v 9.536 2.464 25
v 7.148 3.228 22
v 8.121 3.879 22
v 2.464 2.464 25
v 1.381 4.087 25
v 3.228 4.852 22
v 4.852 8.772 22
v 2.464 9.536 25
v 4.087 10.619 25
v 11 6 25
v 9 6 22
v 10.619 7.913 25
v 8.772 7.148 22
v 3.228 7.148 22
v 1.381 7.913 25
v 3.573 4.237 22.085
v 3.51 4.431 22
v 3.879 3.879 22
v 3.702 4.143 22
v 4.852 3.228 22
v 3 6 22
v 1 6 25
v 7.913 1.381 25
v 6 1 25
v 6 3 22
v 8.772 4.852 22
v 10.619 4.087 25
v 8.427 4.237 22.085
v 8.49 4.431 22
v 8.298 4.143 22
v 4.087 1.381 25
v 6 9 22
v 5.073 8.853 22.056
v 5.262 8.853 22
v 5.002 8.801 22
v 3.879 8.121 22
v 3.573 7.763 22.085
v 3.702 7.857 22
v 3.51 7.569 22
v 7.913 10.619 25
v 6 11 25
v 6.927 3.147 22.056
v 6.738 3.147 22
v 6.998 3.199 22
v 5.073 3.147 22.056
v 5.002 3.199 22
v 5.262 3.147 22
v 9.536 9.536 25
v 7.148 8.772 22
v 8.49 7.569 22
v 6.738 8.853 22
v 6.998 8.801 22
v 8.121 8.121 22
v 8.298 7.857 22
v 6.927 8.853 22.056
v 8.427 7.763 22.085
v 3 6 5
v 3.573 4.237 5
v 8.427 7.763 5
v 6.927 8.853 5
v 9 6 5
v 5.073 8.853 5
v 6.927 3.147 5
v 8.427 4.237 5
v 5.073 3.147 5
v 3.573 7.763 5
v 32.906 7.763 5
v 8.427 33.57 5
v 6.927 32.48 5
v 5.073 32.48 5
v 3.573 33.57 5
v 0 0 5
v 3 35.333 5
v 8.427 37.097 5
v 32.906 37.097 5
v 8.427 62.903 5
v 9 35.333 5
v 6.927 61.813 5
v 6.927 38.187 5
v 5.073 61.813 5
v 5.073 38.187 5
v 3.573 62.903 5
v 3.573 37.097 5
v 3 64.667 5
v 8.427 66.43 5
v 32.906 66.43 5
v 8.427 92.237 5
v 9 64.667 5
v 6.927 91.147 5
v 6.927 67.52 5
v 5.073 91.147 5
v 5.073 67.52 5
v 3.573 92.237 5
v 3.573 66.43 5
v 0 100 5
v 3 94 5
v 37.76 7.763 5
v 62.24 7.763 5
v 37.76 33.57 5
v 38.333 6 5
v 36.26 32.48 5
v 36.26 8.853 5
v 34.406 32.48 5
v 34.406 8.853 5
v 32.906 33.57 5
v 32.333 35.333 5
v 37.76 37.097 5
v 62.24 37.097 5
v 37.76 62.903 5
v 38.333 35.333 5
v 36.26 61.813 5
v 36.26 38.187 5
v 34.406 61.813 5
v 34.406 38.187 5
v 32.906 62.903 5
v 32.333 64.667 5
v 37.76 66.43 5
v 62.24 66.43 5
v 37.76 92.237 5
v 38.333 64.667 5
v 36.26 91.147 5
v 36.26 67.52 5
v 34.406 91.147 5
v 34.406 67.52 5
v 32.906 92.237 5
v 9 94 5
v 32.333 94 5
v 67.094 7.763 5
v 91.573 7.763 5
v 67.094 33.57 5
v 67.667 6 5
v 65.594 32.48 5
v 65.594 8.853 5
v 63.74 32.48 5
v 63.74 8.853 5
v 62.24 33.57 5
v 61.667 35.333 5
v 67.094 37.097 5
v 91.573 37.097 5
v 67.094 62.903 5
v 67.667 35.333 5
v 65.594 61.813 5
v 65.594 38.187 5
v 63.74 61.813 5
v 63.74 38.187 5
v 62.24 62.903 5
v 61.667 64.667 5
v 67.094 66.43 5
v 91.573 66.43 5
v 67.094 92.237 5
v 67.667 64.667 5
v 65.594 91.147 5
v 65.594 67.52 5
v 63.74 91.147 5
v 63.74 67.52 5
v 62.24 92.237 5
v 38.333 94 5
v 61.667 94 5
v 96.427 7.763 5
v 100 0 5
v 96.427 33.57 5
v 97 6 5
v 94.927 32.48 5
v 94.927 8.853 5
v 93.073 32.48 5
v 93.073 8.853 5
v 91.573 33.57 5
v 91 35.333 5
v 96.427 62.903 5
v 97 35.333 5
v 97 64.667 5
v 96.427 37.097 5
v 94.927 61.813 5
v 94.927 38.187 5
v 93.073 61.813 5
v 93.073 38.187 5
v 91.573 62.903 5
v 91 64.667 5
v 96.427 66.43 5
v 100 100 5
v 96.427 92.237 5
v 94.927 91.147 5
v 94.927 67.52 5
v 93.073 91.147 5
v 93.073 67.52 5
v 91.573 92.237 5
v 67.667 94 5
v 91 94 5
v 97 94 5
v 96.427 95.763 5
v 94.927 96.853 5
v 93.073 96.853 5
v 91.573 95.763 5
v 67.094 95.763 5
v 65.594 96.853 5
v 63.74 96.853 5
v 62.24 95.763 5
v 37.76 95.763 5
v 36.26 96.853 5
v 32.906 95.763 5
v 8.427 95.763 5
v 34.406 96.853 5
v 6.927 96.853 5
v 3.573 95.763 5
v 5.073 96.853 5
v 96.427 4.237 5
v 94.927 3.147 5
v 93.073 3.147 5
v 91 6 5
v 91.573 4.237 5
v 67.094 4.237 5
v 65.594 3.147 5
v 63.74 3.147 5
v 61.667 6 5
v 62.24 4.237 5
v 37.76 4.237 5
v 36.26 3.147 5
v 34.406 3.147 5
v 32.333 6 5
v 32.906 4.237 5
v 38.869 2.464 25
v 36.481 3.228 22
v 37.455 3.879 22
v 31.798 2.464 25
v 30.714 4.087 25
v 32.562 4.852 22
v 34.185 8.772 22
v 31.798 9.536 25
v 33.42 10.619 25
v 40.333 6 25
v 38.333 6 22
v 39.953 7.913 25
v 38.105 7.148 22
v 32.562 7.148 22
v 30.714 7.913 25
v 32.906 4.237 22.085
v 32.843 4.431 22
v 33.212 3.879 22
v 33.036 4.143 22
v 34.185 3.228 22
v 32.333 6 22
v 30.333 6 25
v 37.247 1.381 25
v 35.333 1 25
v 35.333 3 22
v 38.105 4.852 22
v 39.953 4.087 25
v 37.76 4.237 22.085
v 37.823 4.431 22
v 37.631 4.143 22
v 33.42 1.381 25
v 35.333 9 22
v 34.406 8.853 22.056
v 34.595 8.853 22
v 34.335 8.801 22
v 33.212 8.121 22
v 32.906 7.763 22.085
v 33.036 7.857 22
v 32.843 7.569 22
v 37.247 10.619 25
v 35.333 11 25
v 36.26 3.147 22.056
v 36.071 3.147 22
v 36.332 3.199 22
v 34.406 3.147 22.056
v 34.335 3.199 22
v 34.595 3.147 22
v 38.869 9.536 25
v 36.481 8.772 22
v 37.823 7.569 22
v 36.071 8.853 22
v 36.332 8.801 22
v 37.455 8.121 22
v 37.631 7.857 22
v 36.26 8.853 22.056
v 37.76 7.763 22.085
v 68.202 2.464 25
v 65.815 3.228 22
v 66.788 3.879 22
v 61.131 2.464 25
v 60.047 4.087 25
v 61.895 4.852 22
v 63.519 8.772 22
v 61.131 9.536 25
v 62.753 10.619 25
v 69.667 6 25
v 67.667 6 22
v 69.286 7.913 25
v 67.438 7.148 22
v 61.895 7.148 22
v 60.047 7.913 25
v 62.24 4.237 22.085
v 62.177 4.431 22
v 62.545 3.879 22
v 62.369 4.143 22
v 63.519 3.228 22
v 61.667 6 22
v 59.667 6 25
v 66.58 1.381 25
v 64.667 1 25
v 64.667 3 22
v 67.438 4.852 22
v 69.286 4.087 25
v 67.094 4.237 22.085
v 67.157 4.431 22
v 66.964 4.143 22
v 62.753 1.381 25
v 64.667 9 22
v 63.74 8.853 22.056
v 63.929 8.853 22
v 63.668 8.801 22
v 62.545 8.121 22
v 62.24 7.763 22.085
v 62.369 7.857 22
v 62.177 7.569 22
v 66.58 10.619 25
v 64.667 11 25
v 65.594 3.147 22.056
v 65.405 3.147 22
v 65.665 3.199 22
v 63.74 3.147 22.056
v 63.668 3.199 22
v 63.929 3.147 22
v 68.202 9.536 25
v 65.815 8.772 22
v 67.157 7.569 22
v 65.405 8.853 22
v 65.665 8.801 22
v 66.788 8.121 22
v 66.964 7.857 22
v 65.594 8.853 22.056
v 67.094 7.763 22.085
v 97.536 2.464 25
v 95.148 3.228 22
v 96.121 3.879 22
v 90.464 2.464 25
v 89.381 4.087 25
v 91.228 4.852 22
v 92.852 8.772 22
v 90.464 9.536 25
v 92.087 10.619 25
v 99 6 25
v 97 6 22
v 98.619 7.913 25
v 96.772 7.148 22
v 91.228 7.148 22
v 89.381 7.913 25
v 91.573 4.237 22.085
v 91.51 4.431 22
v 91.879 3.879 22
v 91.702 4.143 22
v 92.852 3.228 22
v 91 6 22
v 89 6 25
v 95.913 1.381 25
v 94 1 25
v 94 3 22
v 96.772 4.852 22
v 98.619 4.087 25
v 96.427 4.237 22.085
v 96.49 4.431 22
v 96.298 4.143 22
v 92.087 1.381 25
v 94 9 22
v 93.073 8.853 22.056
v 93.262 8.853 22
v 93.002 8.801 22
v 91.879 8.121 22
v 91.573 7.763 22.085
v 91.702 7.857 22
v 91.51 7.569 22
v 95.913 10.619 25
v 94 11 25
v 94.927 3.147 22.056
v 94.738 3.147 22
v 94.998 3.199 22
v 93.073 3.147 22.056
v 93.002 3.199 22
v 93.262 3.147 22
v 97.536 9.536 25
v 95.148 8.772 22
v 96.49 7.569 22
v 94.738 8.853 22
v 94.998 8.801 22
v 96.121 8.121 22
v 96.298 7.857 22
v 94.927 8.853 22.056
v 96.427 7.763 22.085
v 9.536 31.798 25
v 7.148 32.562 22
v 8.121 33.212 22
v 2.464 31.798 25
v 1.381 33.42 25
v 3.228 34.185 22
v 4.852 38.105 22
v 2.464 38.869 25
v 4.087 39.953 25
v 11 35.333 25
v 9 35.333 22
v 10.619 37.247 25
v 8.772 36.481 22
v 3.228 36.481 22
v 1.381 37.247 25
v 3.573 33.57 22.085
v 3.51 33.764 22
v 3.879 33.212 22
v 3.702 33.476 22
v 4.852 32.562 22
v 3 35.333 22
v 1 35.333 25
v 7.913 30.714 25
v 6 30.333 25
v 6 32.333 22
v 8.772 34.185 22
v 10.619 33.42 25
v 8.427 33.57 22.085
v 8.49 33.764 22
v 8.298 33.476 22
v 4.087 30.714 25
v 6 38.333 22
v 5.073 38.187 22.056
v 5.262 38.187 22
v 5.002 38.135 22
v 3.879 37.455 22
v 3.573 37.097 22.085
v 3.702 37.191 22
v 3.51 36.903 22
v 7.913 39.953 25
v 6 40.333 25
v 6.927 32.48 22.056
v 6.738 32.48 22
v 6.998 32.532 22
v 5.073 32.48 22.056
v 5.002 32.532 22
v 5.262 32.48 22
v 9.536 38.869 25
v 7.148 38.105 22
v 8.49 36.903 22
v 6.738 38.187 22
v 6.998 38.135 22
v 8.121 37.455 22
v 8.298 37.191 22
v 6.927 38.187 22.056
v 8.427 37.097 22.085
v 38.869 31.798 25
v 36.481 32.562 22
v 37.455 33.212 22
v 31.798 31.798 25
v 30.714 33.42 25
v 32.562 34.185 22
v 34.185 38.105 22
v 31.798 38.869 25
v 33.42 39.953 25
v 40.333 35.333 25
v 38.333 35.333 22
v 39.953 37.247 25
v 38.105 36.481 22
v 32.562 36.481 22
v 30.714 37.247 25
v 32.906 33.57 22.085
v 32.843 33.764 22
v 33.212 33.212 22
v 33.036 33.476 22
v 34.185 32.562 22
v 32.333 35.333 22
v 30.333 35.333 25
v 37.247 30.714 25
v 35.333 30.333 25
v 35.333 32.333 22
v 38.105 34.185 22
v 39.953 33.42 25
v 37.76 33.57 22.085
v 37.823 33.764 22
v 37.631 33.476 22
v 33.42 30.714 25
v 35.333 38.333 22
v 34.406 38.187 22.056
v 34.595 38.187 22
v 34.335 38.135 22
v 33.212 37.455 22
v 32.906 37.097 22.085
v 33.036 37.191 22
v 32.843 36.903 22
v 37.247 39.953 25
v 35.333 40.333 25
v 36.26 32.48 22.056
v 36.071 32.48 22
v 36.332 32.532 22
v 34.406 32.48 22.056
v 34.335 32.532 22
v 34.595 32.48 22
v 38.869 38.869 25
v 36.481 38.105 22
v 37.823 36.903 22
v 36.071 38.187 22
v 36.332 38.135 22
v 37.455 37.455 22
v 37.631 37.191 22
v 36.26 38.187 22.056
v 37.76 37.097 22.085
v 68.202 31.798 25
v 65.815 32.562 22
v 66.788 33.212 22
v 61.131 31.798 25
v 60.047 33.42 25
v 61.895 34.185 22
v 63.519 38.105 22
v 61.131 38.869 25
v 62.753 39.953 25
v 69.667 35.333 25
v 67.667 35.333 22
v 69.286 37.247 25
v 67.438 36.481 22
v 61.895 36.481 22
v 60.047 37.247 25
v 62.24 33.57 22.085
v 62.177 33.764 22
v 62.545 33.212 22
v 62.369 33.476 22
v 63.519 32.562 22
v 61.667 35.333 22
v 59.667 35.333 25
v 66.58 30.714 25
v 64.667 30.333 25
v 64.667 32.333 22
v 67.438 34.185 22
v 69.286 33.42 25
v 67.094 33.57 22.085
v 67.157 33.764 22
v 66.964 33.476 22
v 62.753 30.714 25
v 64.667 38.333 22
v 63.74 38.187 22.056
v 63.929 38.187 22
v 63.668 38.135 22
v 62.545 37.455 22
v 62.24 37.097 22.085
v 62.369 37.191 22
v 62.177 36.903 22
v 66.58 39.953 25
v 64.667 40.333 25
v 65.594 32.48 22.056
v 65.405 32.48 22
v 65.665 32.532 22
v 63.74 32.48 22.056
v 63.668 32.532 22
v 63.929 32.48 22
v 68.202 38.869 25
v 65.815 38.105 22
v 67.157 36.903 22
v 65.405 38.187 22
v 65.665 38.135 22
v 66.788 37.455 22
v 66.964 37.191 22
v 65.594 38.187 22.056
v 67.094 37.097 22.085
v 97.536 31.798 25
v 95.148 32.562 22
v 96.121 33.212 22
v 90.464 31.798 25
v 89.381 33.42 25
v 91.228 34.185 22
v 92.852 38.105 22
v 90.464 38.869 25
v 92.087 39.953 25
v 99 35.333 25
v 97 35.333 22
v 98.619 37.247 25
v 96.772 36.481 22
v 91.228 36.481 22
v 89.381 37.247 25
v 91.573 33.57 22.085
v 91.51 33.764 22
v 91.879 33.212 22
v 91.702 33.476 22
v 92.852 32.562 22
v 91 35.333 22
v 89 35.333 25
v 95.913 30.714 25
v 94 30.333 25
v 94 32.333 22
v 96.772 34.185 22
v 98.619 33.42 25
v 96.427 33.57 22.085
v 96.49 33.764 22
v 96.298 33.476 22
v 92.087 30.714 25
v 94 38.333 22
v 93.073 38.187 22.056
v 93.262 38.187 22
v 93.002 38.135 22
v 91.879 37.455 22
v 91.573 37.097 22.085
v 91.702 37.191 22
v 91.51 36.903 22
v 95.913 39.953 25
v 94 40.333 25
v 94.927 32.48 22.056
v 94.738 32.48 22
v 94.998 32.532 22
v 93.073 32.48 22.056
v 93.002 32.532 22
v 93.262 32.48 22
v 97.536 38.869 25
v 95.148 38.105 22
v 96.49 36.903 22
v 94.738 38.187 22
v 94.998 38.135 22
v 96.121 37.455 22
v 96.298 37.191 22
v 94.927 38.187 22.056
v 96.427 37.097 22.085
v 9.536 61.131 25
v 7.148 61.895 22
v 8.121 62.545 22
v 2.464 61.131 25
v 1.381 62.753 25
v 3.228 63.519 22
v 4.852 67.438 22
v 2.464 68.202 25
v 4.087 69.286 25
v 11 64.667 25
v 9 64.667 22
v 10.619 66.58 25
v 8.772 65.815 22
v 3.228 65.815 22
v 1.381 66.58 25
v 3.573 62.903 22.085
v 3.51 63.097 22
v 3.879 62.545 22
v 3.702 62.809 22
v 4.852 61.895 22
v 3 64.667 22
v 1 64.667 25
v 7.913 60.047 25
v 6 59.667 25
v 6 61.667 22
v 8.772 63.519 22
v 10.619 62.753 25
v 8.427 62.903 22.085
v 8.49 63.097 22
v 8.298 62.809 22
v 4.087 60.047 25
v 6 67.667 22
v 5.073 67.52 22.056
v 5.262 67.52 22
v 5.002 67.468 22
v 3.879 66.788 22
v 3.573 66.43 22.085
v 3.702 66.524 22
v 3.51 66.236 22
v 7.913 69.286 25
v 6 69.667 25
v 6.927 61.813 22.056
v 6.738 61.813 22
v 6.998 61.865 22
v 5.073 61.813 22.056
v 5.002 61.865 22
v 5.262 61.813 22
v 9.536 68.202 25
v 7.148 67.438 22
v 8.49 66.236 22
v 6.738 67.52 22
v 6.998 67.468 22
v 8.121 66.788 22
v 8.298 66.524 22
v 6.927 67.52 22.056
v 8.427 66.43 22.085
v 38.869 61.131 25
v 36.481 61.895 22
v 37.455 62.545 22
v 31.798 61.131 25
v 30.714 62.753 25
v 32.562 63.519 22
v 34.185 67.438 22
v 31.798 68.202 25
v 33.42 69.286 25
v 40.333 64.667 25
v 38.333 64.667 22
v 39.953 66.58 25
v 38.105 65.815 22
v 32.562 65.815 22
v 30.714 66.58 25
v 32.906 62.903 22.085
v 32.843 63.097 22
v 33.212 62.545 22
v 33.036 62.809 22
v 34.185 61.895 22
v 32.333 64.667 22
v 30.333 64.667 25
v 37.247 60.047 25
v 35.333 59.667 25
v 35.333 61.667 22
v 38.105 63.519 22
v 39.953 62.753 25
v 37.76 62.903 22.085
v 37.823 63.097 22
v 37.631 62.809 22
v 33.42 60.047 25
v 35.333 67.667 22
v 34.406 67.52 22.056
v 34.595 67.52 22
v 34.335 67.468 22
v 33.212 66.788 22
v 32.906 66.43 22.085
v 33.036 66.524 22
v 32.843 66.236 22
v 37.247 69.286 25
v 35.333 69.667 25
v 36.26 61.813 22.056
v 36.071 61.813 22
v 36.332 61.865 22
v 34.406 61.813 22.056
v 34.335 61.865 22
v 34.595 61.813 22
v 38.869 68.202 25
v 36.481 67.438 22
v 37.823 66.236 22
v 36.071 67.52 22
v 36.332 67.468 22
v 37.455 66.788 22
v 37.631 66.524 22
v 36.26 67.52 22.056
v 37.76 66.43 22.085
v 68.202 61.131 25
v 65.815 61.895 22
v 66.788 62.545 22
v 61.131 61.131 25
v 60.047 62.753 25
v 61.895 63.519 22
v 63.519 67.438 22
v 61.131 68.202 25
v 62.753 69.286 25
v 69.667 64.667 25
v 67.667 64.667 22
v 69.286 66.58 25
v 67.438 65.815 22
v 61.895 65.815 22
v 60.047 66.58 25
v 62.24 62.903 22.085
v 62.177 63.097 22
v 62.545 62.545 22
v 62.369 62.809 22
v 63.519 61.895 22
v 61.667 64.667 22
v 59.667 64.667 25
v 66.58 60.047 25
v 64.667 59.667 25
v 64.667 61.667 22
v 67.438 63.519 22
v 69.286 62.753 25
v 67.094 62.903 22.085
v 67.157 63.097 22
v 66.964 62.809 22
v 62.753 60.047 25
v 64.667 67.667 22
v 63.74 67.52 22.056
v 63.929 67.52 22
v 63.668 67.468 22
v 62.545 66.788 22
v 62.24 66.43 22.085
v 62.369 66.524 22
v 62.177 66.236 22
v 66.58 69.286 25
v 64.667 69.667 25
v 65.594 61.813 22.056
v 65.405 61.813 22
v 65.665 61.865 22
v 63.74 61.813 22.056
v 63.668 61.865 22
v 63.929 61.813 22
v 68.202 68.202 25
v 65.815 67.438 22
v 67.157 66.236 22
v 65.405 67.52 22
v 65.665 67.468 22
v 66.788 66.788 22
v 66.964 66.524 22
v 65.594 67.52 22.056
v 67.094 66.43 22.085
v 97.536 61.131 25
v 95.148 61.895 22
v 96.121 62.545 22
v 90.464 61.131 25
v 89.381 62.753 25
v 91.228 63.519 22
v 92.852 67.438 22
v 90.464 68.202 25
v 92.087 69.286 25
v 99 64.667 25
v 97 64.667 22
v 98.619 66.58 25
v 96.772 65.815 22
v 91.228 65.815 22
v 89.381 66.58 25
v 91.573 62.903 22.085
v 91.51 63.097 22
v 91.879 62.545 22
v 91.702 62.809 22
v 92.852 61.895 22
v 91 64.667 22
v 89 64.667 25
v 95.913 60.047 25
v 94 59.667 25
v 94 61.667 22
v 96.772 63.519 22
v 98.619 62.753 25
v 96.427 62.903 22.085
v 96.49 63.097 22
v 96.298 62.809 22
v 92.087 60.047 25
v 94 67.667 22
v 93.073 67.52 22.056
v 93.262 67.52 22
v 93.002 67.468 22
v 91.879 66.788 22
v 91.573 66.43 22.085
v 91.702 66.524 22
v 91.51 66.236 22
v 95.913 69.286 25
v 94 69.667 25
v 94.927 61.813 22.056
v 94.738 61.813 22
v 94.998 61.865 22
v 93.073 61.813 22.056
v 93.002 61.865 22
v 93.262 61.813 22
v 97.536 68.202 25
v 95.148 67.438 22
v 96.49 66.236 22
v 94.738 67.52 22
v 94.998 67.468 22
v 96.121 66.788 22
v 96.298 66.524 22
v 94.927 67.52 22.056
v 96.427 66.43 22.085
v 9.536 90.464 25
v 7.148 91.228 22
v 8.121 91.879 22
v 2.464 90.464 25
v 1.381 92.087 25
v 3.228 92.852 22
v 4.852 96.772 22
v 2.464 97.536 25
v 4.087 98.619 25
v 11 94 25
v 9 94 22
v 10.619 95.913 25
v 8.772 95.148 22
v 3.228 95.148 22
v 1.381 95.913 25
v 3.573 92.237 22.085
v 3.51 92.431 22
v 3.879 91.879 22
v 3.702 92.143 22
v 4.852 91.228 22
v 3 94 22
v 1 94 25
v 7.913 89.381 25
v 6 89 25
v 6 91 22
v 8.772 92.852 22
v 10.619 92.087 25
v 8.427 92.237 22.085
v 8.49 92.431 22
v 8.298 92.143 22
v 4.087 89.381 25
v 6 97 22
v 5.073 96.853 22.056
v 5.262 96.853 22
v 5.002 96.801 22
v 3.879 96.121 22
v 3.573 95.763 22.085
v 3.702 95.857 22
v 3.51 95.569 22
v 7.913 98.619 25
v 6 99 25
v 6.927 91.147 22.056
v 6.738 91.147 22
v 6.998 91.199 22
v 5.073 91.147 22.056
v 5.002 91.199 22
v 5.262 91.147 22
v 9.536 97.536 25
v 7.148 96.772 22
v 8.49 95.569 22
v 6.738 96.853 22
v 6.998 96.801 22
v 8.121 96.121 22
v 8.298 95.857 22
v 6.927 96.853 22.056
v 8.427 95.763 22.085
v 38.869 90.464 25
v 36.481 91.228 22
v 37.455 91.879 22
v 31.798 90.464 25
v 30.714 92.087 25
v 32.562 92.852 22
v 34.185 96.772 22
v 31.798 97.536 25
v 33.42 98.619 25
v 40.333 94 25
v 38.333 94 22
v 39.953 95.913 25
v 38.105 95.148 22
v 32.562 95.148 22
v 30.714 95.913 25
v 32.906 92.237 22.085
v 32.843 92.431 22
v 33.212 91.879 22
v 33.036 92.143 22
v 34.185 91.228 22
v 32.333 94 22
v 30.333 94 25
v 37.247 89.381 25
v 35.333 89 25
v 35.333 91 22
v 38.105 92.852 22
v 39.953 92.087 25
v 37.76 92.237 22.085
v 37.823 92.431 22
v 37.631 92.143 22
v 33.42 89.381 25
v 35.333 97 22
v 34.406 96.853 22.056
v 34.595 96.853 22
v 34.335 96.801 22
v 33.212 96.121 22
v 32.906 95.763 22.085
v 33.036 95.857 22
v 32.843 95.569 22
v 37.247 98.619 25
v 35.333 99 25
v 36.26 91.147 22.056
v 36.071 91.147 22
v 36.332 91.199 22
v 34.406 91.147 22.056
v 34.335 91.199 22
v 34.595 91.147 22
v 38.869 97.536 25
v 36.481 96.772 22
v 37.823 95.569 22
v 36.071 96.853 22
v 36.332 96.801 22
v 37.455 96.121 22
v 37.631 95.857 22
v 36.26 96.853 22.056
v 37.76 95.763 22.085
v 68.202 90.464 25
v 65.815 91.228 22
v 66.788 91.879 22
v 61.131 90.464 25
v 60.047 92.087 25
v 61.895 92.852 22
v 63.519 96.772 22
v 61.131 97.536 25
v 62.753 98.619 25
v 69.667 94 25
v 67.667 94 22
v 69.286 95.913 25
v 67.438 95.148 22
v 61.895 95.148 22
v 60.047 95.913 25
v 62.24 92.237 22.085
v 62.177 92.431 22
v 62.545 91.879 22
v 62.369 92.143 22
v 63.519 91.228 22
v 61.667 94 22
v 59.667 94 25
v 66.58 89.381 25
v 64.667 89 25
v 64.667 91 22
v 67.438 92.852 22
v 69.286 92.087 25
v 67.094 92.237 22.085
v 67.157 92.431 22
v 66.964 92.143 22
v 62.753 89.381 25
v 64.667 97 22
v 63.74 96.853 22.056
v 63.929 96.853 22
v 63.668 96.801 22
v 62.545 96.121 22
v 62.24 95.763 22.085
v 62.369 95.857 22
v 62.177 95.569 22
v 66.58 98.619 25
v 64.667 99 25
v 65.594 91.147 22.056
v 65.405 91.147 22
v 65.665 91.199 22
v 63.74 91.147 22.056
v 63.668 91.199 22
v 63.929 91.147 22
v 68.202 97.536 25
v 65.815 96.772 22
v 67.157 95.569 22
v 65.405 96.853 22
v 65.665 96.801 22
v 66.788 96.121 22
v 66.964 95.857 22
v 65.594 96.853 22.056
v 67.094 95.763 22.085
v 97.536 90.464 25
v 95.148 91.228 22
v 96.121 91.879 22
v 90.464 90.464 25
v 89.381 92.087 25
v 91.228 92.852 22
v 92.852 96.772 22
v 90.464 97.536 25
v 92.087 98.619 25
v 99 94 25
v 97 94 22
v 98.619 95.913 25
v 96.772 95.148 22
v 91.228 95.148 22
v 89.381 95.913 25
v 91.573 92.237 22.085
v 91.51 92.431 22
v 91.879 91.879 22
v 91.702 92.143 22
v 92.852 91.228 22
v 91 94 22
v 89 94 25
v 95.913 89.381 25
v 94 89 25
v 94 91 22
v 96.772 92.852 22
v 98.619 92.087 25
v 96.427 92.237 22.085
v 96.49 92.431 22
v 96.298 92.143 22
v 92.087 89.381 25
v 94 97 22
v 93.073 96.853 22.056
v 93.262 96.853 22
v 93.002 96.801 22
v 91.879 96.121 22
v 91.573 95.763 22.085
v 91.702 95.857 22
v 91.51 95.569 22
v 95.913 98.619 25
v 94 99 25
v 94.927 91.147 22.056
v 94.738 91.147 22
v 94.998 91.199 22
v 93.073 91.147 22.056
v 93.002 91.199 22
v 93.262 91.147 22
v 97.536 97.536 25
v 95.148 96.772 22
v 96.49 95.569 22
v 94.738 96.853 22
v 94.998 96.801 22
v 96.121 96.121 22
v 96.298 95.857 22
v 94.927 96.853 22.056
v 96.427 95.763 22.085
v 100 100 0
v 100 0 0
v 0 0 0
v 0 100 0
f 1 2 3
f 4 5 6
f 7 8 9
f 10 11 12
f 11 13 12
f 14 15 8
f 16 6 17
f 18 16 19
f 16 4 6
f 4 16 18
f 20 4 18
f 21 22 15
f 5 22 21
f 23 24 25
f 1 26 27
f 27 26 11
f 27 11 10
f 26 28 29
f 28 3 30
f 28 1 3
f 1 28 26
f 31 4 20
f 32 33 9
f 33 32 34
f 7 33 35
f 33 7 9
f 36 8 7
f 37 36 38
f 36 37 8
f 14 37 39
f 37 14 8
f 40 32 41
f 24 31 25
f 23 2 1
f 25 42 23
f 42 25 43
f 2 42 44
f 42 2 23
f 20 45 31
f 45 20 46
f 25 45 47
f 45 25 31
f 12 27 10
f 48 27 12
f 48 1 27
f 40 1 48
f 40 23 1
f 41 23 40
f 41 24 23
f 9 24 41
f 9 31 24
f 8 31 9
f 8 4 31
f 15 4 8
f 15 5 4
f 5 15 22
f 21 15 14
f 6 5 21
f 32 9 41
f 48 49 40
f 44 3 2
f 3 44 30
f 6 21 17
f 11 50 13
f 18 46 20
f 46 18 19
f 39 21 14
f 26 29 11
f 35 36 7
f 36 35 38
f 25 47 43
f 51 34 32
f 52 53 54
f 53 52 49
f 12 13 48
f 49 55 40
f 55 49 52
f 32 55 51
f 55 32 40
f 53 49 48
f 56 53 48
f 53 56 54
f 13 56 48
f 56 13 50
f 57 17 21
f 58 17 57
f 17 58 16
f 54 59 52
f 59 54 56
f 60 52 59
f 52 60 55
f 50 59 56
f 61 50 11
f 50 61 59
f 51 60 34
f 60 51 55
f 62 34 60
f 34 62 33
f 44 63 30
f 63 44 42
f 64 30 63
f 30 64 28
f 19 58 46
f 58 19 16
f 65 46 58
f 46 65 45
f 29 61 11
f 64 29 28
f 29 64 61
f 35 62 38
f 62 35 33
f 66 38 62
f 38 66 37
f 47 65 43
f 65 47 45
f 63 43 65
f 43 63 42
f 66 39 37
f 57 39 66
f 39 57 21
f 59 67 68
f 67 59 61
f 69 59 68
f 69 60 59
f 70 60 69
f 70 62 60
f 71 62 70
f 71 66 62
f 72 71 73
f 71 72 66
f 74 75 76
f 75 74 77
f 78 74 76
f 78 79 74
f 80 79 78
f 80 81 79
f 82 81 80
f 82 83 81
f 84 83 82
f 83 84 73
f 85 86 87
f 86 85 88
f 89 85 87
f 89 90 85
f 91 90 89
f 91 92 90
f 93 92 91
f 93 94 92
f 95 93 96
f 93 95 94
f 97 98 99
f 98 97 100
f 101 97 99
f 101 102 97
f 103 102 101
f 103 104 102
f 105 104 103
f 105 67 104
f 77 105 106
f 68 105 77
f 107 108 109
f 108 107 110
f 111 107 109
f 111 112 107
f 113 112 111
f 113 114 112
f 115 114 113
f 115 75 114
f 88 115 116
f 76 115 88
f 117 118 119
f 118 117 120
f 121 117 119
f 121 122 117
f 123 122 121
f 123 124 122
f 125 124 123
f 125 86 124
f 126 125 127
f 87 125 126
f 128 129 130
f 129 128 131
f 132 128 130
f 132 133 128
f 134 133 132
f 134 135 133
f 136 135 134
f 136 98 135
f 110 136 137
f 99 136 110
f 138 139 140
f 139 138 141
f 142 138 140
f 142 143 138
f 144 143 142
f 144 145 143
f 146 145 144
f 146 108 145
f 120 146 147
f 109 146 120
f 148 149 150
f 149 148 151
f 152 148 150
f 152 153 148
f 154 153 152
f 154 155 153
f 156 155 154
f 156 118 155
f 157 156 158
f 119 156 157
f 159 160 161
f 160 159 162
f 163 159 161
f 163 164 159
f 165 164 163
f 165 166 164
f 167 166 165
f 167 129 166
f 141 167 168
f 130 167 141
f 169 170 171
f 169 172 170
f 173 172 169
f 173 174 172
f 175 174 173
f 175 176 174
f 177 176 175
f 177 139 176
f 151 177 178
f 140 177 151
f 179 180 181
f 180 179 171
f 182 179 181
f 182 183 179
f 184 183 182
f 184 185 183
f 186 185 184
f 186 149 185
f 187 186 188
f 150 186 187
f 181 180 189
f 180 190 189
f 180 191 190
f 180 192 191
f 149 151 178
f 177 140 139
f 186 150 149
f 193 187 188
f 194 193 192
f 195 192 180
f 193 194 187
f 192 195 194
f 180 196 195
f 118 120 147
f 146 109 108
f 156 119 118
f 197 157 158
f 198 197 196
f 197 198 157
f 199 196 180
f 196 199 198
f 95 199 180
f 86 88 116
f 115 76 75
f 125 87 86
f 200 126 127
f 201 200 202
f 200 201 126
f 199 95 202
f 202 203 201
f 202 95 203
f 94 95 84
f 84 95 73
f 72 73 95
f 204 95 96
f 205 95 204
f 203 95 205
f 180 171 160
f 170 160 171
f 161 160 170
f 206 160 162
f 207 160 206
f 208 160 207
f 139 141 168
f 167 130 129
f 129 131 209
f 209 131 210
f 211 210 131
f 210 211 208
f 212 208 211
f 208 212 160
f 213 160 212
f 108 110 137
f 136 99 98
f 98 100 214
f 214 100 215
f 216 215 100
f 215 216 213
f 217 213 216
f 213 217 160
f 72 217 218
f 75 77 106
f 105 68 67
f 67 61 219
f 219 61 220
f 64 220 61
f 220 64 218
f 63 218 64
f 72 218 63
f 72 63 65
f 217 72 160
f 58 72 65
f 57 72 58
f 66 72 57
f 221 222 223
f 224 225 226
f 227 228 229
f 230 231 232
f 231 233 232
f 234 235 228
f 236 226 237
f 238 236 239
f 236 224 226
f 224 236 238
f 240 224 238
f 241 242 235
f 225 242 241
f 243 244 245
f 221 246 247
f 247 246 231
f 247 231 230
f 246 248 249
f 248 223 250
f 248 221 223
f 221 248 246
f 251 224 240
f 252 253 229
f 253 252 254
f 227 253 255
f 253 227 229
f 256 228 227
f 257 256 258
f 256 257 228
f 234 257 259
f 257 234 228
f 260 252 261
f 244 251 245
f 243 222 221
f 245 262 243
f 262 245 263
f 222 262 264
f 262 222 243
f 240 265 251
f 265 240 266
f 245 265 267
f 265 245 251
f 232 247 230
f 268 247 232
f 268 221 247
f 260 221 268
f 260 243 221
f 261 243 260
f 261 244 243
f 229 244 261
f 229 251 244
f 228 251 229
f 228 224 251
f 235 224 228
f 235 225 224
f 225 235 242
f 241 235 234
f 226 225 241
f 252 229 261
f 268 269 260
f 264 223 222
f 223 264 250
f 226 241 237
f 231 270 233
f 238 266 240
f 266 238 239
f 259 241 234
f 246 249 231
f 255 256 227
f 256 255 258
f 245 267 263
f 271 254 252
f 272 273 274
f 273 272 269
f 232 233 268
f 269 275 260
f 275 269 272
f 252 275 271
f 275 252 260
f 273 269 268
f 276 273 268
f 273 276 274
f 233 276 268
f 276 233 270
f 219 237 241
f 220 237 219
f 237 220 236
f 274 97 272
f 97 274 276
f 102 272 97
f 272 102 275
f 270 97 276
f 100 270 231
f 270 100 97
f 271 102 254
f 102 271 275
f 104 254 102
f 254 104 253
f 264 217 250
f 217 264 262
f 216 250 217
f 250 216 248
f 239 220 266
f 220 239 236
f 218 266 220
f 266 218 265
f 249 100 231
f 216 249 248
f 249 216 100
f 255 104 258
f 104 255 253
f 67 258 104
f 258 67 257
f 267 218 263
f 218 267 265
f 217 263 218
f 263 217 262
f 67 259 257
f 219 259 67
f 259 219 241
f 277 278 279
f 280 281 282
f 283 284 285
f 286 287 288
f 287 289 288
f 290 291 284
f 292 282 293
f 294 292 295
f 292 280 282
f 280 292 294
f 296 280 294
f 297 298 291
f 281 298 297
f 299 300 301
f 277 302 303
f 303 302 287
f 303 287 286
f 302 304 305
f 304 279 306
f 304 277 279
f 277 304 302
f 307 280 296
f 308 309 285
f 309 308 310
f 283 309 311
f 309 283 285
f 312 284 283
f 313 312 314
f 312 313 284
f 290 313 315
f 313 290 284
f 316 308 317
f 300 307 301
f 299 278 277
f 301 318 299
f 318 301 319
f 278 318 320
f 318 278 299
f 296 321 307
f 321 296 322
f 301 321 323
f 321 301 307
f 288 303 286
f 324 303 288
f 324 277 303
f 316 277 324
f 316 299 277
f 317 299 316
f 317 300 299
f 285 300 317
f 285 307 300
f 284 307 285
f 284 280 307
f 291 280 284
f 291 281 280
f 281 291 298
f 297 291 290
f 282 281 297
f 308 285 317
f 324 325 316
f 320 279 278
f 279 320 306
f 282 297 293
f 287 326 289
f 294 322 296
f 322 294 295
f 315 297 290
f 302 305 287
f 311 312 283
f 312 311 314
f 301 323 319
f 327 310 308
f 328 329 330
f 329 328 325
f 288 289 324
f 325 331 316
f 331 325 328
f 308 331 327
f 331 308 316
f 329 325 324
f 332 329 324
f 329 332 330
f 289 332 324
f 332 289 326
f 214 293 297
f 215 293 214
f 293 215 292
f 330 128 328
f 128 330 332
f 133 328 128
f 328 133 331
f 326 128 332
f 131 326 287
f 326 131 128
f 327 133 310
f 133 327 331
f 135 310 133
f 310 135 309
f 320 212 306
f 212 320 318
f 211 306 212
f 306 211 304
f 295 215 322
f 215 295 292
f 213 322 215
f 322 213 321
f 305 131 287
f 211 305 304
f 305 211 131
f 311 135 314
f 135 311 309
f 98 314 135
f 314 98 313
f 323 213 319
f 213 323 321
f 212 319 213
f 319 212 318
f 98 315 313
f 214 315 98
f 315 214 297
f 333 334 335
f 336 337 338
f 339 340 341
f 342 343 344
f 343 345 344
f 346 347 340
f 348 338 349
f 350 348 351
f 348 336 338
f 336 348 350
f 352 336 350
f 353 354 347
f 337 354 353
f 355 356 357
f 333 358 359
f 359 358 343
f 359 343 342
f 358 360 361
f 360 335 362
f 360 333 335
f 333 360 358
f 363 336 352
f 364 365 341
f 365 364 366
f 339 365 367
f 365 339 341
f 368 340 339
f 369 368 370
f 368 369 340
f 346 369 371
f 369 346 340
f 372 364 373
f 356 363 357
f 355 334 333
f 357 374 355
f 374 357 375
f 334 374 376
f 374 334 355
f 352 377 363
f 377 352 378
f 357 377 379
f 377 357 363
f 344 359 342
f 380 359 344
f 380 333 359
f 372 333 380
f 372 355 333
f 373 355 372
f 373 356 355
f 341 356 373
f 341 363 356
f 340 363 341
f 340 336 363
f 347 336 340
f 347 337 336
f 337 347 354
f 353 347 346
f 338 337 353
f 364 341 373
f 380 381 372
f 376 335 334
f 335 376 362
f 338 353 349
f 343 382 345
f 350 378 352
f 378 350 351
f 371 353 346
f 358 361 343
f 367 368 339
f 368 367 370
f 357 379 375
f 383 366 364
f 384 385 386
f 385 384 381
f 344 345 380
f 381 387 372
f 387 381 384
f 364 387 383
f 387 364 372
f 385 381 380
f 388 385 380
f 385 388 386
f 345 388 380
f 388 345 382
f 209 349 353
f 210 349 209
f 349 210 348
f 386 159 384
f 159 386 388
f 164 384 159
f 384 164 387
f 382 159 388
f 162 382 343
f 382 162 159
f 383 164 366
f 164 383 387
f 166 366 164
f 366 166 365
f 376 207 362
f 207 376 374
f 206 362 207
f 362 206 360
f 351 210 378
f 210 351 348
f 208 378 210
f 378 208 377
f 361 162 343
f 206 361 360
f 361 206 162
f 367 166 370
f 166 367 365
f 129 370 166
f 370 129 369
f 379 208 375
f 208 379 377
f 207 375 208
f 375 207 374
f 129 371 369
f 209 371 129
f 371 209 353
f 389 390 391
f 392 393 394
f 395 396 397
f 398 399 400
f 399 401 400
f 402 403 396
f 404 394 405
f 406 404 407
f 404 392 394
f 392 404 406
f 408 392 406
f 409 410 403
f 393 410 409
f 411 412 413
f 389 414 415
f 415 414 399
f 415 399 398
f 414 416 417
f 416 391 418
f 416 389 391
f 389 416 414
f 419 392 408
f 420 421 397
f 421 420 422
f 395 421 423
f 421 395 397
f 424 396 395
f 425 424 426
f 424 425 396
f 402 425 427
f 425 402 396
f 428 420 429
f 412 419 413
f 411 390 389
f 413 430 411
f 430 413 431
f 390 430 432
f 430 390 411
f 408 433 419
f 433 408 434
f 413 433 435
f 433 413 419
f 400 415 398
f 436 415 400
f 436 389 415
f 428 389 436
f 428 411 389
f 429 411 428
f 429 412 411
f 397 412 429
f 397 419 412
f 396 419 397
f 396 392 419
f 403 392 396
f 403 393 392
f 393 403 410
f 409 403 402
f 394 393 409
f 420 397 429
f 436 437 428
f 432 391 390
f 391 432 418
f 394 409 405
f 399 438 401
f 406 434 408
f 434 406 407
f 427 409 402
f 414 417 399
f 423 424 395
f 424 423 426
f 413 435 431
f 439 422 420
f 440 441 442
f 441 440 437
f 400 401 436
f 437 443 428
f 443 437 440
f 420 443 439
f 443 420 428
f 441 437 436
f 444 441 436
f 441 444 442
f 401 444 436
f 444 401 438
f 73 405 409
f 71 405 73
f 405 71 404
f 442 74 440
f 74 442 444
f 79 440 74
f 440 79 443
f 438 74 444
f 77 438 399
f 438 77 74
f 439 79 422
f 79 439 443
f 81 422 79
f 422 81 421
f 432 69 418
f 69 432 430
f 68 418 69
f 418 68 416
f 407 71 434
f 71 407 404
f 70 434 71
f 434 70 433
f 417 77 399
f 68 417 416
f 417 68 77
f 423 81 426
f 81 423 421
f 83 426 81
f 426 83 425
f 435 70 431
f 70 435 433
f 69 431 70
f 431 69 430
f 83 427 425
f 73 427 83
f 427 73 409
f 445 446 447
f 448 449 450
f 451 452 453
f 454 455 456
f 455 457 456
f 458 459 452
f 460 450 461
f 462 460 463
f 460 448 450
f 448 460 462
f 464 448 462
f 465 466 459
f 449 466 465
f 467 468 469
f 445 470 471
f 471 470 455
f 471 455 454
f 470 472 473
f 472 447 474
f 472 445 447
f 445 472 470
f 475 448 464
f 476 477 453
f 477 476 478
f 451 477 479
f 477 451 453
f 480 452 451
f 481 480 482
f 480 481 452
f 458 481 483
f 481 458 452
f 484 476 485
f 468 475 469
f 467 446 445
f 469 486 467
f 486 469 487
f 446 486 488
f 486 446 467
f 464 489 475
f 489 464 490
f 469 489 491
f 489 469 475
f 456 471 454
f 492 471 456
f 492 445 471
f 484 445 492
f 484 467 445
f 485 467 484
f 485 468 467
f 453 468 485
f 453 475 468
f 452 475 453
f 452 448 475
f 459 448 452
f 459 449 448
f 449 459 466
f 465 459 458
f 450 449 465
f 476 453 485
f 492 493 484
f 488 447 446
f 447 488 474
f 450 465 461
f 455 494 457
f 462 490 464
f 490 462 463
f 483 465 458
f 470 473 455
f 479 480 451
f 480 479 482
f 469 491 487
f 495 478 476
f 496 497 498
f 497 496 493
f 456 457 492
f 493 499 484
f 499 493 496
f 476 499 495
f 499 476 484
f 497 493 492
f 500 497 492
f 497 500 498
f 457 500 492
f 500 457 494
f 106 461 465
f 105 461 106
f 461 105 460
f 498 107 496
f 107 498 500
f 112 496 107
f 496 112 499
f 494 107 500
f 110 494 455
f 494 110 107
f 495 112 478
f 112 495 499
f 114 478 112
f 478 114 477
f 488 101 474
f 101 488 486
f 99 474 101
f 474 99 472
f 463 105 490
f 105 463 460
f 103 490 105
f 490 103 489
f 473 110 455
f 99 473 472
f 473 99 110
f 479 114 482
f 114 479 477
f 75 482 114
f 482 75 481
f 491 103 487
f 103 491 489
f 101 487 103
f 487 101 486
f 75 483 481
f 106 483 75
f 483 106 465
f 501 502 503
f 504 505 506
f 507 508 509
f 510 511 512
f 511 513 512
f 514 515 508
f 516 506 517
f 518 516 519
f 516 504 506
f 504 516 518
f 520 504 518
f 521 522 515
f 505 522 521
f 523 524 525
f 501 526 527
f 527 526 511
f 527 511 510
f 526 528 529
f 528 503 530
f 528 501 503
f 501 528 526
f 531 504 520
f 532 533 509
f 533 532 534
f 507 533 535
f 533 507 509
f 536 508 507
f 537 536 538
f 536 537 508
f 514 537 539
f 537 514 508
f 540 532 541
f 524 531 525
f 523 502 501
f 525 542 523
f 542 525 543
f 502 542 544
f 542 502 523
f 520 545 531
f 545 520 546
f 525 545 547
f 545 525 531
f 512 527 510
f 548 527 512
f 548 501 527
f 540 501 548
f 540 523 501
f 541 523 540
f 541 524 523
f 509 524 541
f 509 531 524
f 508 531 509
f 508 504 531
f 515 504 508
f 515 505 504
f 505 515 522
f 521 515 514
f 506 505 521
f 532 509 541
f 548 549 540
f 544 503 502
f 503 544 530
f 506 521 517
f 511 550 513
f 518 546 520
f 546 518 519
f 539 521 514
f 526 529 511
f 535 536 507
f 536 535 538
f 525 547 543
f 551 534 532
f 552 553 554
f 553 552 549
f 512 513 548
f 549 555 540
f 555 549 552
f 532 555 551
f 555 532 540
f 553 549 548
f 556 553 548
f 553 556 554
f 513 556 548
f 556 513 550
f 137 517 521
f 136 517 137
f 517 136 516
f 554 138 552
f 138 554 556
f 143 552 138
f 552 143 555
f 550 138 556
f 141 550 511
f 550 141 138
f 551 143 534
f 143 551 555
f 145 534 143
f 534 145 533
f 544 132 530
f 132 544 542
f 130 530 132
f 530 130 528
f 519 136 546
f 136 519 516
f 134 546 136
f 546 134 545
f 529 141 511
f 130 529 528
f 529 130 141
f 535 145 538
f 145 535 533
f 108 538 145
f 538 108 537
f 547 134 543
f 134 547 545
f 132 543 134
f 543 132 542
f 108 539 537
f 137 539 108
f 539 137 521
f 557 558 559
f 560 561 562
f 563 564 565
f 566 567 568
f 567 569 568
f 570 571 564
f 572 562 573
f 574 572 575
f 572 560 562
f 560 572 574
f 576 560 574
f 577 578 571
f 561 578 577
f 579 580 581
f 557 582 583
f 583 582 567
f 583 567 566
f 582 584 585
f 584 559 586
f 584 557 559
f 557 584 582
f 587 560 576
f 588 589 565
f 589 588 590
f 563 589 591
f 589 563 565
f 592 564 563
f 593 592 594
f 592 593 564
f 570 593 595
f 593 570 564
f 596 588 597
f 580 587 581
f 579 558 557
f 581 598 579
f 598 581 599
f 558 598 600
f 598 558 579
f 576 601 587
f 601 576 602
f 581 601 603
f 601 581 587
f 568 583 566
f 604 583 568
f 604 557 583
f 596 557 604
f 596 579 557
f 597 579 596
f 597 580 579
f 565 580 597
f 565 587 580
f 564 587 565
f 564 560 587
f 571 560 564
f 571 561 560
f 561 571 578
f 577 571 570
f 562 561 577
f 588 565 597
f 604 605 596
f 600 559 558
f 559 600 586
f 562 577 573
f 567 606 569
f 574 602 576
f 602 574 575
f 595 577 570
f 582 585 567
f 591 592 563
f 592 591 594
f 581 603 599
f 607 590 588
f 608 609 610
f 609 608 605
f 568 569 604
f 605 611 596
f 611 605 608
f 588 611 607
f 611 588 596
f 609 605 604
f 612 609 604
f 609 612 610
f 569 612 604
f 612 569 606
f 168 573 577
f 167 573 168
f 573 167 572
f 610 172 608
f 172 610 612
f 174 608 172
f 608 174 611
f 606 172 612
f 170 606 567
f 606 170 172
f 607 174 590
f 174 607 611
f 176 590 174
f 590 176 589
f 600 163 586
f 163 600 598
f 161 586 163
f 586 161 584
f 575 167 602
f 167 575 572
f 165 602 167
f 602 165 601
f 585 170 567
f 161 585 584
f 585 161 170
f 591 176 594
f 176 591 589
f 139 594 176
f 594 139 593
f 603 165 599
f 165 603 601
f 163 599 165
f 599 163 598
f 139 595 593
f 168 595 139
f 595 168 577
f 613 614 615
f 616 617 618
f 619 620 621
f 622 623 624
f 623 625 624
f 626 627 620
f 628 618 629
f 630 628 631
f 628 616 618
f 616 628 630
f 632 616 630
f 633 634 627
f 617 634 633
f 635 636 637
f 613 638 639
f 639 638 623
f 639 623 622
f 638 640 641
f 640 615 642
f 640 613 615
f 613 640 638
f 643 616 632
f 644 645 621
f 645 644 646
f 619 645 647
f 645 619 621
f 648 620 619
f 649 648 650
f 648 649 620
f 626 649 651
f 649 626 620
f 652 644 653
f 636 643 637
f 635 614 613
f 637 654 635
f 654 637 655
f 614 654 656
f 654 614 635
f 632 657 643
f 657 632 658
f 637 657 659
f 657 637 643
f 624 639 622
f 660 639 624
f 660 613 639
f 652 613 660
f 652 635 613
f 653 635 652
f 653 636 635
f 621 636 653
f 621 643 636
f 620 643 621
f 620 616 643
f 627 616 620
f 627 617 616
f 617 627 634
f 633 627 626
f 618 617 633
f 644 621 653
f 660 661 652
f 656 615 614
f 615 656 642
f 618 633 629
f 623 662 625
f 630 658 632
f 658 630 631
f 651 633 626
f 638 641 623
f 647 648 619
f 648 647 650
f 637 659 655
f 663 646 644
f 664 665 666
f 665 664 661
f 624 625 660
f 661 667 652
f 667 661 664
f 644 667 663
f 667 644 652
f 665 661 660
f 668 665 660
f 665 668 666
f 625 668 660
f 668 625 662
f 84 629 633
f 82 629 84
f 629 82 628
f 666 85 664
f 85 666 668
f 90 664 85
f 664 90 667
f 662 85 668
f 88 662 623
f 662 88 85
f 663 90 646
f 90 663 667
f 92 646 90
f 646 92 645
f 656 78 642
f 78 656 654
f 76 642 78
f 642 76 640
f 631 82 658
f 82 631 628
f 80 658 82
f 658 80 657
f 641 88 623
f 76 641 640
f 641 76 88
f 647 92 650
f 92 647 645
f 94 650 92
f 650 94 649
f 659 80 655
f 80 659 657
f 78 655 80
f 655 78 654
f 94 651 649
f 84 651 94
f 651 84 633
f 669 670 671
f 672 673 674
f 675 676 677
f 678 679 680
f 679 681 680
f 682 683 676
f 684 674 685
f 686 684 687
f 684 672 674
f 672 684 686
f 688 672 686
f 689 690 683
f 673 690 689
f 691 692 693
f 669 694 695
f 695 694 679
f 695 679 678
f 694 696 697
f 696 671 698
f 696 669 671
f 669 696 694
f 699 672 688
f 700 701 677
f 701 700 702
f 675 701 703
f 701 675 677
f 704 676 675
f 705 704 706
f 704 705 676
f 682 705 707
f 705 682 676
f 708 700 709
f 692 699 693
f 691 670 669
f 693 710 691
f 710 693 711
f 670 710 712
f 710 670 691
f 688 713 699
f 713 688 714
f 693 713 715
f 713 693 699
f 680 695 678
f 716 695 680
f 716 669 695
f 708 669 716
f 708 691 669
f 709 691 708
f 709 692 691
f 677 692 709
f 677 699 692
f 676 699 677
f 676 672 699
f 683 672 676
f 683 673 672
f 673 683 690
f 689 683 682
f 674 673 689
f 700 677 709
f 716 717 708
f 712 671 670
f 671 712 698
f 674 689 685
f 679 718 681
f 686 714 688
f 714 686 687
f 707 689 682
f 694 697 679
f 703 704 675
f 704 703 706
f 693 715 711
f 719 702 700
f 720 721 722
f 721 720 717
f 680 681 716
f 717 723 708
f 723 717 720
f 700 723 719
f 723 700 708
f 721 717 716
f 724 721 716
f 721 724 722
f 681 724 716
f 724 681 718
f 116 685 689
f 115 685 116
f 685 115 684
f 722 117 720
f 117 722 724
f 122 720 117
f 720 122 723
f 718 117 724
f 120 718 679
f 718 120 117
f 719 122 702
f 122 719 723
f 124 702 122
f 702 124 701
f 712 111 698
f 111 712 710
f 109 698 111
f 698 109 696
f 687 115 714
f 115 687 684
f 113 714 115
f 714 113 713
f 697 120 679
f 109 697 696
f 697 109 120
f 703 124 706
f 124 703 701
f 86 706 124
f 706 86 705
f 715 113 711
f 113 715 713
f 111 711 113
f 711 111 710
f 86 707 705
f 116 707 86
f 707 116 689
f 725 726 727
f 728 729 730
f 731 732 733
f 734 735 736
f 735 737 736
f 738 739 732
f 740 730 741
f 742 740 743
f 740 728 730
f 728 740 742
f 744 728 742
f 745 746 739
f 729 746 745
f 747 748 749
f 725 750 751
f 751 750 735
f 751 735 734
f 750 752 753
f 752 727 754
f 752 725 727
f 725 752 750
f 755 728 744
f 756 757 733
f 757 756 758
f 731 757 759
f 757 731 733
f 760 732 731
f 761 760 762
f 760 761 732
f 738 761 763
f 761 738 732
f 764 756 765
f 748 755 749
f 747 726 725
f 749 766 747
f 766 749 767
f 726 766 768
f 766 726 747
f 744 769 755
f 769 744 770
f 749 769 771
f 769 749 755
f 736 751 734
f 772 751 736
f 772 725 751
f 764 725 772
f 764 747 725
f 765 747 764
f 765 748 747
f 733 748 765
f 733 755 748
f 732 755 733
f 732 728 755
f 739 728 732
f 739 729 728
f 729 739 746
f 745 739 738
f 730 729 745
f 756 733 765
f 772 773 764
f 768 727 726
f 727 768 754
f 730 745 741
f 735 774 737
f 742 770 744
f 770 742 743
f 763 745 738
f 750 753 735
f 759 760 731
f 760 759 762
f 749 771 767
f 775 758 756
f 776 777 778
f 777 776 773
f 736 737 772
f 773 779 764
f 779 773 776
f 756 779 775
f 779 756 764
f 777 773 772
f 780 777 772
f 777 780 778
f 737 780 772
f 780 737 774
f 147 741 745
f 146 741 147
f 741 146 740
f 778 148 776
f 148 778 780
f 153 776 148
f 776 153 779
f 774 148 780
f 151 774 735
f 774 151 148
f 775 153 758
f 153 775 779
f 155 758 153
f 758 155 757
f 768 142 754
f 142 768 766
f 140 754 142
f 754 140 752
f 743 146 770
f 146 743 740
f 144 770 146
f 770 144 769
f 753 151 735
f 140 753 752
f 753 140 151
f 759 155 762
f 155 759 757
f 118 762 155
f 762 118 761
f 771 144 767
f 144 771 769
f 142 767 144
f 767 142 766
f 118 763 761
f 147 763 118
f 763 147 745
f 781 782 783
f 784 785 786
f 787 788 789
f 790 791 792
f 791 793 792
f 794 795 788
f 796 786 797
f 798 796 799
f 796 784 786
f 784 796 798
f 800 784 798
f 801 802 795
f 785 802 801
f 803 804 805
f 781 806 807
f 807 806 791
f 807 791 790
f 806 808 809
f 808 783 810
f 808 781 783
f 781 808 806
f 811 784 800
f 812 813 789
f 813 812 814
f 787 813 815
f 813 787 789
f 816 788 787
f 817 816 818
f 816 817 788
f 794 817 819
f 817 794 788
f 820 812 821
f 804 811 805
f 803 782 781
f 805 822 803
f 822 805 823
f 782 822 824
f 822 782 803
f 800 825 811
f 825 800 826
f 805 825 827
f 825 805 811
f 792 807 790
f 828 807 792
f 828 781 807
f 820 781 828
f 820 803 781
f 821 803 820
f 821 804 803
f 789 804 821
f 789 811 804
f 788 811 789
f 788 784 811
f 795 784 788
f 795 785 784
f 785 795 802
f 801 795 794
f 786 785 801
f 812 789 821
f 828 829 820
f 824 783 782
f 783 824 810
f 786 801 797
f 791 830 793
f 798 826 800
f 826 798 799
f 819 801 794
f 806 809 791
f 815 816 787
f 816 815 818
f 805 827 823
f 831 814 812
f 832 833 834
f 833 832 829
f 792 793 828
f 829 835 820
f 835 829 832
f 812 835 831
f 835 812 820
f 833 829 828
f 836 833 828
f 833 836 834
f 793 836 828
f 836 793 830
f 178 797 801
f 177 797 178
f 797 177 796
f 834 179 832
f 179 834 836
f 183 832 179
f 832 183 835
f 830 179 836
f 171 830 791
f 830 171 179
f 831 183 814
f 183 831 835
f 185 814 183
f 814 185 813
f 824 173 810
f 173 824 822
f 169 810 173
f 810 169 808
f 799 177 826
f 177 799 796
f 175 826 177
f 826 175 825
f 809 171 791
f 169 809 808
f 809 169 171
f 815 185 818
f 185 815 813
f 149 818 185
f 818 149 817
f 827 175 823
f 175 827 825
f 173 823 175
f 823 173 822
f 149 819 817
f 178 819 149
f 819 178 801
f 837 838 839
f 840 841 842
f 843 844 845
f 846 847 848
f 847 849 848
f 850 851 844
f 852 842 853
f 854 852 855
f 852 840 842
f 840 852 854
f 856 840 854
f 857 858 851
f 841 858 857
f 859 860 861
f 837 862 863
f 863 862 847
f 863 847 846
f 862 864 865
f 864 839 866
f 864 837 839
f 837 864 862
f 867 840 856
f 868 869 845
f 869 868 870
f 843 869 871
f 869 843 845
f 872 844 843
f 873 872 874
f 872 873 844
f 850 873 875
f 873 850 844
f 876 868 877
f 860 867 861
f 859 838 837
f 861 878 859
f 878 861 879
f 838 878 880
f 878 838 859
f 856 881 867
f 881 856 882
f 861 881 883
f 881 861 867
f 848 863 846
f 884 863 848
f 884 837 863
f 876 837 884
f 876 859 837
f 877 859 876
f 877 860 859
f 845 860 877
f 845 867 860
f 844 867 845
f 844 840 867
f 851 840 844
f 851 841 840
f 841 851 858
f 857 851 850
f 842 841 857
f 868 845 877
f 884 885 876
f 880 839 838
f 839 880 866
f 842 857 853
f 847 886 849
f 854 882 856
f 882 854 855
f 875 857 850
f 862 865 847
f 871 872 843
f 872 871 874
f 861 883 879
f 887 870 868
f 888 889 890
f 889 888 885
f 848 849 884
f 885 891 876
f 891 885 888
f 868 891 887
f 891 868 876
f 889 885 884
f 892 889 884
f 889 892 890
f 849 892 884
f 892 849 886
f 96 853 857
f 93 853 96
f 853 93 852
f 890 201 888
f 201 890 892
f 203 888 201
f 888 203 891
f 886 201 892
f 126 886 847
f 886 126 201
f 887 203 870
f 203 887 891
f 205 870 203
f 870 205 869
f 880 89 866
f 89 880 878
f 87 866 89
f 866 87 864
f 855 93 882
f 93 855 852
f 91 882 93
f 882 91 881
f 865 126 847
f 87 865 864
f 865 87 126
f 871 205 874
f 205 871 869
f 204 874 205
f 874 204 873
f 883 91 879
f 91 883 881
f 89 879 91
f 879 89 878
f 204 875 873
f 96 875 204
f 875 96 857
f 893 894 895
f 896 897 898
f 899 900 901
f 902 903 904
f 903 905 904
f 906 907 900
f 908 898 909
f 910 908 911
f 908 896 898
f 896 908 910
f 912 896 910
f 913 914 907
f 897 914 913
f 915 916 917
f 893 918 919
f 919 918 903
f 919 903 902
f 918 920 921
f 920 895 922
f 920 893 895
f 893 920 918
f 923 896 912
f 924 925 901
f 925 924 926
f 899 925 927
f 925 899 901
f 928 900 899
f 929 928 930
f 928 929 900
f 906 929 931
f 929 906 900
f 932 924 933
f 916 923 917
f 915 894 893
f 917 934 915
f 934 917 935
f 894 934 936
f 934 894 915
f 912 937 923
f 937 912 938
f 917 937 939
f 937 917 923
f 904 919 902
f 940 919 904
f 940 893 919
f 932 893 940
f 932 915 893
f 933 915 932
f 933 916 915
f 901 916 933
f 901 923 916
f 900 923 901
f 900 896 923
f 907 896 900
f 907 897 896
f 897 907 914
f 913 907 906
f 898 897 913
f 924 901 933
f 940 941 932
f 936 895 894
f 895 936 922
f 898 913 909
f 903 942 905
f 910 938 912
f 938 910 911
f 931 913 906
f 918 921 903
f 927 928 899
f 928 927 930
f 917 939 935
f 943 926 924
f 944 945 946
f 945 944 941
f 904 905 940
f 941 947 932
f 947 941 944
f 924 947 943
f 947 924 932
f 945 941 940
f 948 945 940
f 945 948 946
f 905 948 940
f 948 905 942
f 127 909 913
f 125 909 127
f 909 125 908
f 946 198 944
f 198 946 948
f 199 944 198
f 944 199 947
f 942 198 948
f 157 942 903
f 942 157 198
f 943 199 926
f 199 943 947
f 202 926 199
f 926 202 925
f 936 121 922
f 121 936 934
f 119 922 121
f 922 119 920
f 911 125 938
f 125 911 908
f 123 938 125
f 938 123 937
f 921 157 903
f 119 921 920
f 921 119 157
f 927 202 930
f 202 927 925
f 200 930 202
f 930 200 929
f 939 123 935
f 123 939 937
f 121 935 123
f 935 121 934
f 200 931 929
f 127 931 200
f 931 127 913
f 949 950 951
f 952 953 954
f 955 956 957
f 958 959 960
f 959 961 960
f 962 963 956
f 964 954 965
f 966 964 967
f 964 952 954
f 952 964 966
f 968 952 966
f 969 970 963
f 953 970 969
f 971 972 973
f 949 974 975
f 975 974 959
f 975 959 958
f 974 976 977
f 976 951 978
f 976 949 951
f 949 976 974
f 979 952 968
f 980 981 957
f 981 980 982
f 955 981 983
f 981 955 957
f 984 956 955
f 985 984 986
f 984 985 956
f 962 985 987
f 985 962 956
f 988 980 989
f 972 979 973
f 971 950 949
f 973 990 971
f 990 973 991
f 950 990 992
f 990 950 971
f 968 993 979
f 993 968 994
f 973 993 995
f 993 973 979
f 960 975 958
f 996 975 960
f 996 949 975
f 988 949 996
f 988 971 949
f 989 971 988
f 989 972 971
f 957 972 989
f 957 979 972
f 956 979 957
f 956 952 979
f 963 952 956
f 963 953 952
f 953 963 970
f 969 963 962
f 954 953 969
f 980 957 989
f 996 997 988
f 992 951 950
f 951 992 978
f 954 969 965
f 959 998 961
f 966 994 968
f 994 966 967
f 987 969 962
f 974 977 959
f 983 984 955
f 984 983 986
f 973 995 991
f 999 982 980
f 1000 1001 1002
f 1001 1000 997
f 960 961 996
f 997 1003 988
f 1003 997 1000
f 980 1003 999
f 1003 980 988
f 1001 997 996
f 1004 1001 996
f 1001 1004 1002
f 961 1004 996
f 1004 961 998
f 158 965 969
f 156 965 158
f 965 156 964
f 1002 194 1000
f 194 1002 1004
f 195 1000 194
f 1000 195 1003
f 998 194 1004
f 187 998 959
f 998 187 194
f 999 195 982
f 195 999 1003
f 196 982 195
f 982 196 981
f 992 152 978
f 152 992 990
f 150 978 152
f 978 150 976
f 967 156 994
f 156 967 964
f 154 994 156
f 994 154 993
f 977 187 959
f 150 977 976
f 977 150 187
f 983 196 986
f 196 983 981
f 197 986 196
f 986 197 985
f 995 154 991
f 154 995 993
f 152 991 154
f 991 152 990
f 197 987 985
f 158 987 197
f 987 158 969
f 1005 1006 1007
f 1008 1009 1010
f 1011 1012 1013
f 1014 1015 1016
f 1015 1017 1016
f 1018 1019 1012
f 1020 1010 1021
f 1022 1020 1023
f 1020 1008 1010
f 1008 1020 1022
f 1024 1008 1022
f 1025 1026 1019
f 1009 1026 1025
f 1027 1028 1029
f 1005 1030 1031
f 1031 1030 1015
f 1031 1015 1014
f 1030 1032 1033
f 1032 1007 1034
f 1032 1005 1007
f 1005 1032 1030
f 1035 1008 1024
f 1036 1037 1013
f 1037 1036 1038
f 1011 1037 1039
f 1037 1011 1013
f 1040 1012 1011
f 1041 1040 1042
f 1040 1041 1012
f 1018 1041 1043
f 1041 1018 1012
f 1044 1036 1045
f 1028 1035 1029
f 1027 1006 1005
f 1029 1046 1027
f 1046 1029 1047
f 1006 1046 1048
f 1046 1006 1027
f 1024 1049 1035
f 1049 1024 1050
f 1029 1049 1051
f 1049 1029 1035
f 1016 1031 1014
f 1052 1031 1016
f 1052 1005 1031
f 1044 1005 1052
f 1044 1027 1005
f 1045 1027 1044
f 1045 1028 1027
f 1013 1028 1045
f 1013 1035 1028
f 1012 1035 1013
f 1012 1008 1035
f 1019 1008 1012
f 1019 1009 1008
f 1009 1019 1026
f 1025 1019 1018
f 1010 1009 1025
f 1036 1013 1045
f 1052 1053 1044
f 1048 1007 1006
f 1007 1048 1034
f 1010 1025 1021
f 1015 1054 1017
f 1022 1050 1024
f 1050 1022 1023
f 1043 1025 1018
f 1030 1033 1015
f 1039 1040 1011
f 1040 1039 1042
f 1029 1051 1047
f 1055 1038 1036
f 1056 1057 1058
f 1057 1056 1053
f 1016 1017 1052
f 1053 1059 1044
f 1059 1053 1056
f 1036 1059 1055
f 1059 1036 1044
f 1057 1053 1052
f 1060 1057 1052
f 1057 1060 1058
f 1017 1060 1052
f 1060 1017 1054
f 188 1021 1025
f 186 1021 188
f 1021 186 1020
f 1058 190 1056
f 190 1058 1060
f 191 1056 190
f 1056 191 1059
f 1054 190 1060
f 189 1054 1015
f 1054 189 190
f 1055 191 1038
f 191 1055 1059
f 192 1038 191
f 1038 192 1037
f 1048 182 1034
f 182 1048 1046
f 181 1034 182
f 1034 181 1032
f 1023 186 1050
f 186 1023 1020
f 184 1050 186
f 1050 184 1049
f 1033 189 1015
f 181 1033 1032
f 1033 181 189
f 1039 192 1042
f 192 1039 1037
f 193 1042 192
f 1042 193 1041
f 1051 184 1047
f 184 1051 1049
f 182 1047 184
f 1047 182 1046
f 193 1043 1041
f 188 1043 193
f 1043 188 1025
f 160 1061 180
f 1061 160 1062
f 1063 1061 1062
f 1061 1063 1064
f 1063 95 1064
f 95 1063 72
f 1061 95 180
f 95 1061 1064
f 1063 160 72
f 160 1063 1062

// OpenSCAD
//This creates a customizable square geoboard. Everything I could think of is customizable.

//Size of base
base_size = 100; // [10:500]

//Thickness of base
base_thickness = 5;

//Peg thickness
peg_thickness = 3; // [1:10]

//Peg height
peg_height = 20; // [10:50]

//Number of pegs on X axis
X_pegs = 4;

//Number of pegs on Y axis
Y_pegs = 4;

//Width of step on top of peg
step_width = 2; // [0:5]

//% of peg height for step
step_percent = 15; // [5:90]

module peg()
{
translate([0,0,(peg_height+base_thickness)-peg_height*(step_percent/100)])cylinder(peg_height*(step_percent/100),peg_thickness,peg_thickness+step_width);
translate([0,0,base_thickness])cylinder(peg_height,peg_thickness,peg_thickness);
}
cube([base_size,base_size,base_thickness]);

module peg_line()
{
for (i = [0 : X_pegs-1] ){
translate([((base_size-peg_thickness*4)/(X_pegs-1))*(i)+peg_thickness*2,peg_thickness*2,0]) peg();
}
}

for (i = [0 : Y_pegs-1] ){
translate([0,((base_size-peg_thickness*4)/(Y_pegs-1))*(i),0]) peg_line();
}
